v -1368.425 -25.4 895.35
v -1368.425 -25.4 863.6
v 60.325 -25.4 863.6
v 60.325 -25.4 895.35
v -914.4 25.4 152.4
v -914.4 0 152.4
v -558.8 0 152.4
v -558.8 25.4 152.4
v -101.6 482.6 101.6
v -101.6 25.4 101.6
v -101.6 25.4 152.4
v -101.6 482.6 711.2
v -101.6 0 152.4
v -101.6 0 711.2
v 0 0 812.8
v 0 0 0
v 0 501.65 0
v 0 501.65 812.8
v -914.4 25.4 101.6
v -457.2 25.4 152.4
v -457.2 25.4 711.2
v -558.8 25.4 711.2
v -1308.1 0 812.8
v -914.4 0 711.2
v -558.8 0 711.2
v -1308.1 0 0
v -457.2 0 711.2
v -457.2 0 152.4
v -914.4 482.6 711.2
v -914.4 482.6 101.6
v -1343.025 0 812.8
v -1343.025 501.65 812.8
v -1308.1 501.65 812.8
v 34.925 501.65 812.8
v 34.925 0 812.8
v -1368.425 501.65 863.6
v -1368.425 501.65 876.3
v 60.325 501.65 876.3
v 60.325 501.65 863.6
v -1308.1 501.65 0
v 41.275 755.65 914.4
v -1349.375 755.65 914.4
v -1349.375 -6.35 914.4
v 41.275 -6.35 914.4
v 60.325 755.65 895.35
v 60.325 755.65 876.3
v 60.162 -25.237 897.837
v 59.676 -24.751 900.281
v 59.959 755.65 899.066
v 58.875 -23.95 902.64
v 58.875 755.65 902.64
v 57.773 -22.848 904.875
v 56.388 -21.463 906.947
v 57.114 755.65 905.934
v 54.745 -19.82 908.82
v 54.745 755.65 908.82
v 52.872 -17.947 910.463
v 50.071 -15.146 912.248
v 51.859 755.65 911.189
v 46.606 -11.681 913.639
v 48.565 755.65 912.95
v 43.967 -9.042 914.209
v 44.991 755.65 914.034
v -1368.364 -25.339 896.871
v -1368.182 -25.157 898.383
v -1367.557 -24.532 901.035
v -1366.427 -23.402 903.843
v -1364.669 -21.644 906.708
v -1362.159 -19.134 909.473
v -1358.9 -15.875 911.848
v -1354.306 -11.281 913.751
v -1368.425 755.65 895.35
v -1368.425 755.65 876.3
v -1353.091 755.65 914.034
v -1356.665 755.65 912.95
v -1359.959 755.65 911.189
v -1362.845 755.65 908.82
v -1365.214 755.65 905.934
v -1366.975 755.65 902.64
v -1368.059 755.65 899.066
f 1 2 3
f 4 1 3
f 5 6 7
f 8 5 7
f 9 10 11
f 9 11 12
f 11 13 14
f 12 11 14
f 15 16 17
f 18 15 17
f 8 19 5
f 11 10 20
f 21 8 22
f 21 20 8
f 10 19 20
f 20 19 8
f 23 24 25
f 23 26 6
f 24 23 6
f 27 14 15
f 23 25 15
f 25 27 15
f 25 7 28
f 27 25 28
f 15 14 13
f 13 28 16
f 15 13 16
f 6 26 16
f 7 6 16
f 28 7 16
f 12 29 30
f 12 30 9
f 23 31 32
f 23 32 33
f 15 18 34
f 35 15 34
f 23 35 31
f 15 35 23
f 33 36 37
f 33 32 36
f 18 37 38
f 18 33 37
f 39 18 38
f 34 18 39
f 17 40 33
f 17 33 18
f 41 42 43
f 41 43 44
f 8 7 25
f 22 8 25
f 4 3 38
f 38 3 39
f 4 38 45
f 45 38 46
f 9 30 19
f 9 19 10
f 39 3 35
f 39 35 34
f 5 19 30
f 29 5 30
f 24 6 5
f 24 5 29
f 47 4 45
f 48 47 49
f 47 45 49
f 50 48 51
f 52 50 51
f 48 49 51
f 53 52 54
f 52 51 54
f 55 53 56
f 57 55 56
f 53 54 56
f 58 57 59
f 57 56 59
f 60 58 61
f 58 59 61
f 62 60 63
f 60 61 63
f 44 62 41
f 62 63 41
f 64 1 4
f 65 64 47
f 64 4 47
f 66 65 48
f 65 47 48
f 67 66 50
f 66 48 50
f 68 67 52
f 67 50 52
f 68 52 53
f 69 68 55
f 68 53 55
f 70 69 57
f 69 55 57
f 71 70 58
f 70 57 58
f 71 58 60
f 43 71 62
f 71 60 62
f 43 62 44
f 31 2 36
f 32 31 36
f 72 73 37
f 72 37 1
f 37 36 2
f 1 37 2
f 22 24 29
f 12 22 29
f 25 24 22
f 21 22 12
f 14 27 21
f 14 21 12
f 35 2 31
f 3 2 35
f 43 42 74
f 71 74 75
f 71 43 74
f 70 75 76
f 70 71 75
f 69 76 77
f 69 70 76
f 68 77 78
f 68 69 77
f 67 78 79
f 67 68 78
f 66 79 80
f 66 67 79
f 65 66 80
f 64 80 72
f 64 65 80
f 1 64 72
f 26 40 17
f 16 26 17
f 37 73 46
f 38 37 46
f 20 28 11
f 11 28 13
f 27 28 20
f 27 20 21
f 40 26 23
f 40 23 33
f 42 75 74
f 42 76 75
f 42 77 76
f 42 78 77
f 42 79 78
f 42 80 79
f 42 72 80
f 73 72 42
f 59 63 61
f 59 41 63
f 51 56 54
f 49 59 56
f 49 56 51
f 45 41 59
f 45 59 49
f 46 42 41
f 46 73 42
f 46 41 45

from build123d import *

# Parameters (mm, degrees)
F0_W      = 1308.1
F0_H      = 501.65
F1_DEPTH  = 812.8
F2_W      = 1428.75
F2_H      = 527.05
F3_DEPTH  = 63.5
F4_SIZE2  = 50.79999
F4_SIZE   = 25.39999
F5_W      = 1428.75
F5_H      = 527.05
F5_H_2    = 254
F6_DEPTH  = 38.1
F7_R      = 19.05
F8_W      = 355.6
F8_H      = 558.8
F9_DEPTH  = 482.6
F10_W     = 457.2
F10_H     = 558.8
F11_DEPTH = 152.4
F13_DEPTH = 50.8


# Not quite as in the source:
# - a fillet or chamfer is up to 0.001 mm smaller than in the source, because OpenCascade refuses the exact size


with BuildPart() as f1:
    # F0 (on Top) → F1 (new body)
    with BuildSketch(Plane.XY):
        with Locations((-654.05, 250.825)):
            Rectangle(F0_W, F0_H)
    extrude(amount=F1_DEPTH)

    # F2 (on face) → F3 (join)
    with BuildSketch(Plane.XY.offset(812.8)):
        with Locations((-654.05, 238.125)):
            Rectangle(F2_W, F2_H)
    extrude(amount=F3_DEPTH)

    # F4 (size 25.4 and 50.8 in the source; OpenCascade refuses exactly that, so slightly less here)
    f4_edges = [f1.edges().sort_by_distance(p)[0] for p in [
        (-1368.425, 238.125, 812.8),
        (-654.05, -25.4, 812.8),
        (60.325, 238.125, 812.8),
    ]]
    f4_side = f1.faces().sort_by_distance((-654.05, -10.171381, 812.8))[0]
    chamfer(f4_edges, length=F4_SIZE, length2=F4_SIZE2, reference=f4_side)

    # F5 (on face) → F6 (join)
    with BuildSketch(Plane.XY.offset(876.3)):
        with Locations((-654.05, 238.125)):
            Rectangle(F5_W, F5_H)
        with Locations((-654.05, 628.65)):
            Rectangle(F5_W, F5_H_2)
    extrude(amount=F6_DEPTH)

    # F7
    f7_edges = [f1.edges().sort_by_distance(p)[0] for p in [
        (-1368.425, 365.125, 914.4),
        (-654.05, -25.4, 914.4),
        (60.325, 365.125, 914.4),
    ]]
    fillet(f7_edges, radius=F7_R)

    # F8 (on face) → F9 (cut)
    with BuildSketch(Plane.XZ):
        with Locations((-279.4, 431.8)):
            Rectangle(F8_W, F8_H)
        with Locations((-736.6, 431.8)):
            Rectangle(F8_W, F8_H)
    extrude(amount=-F9_DEPTH, mode=Mode.SUBTRACT)

    # F10 (on face) → F11 (cut)
    with BuildSketch(Plane.YZ.offset(-457.2)):
        with Locations((254, 431.8)):
            Rectangle(F10_W, F10_H)
    extrude(amount=-F11_DEPTH, mode=Mode.SUBTRACT)

    # F12 (on face) → F13 (cut)
    with BuildSketch(Plane.XY.offset(152.4)):
        Polygon((-101.6, 482.6), (-914.4, 482.6), (-914.4, 25.4), (-558.8, 25.4), (-457.2, 25.4), (-101.6, 25.4), align=None)
    extrude(amount=-F13_DEPTH, mode=Mode.SUBTRACT)


solid = f1.part
